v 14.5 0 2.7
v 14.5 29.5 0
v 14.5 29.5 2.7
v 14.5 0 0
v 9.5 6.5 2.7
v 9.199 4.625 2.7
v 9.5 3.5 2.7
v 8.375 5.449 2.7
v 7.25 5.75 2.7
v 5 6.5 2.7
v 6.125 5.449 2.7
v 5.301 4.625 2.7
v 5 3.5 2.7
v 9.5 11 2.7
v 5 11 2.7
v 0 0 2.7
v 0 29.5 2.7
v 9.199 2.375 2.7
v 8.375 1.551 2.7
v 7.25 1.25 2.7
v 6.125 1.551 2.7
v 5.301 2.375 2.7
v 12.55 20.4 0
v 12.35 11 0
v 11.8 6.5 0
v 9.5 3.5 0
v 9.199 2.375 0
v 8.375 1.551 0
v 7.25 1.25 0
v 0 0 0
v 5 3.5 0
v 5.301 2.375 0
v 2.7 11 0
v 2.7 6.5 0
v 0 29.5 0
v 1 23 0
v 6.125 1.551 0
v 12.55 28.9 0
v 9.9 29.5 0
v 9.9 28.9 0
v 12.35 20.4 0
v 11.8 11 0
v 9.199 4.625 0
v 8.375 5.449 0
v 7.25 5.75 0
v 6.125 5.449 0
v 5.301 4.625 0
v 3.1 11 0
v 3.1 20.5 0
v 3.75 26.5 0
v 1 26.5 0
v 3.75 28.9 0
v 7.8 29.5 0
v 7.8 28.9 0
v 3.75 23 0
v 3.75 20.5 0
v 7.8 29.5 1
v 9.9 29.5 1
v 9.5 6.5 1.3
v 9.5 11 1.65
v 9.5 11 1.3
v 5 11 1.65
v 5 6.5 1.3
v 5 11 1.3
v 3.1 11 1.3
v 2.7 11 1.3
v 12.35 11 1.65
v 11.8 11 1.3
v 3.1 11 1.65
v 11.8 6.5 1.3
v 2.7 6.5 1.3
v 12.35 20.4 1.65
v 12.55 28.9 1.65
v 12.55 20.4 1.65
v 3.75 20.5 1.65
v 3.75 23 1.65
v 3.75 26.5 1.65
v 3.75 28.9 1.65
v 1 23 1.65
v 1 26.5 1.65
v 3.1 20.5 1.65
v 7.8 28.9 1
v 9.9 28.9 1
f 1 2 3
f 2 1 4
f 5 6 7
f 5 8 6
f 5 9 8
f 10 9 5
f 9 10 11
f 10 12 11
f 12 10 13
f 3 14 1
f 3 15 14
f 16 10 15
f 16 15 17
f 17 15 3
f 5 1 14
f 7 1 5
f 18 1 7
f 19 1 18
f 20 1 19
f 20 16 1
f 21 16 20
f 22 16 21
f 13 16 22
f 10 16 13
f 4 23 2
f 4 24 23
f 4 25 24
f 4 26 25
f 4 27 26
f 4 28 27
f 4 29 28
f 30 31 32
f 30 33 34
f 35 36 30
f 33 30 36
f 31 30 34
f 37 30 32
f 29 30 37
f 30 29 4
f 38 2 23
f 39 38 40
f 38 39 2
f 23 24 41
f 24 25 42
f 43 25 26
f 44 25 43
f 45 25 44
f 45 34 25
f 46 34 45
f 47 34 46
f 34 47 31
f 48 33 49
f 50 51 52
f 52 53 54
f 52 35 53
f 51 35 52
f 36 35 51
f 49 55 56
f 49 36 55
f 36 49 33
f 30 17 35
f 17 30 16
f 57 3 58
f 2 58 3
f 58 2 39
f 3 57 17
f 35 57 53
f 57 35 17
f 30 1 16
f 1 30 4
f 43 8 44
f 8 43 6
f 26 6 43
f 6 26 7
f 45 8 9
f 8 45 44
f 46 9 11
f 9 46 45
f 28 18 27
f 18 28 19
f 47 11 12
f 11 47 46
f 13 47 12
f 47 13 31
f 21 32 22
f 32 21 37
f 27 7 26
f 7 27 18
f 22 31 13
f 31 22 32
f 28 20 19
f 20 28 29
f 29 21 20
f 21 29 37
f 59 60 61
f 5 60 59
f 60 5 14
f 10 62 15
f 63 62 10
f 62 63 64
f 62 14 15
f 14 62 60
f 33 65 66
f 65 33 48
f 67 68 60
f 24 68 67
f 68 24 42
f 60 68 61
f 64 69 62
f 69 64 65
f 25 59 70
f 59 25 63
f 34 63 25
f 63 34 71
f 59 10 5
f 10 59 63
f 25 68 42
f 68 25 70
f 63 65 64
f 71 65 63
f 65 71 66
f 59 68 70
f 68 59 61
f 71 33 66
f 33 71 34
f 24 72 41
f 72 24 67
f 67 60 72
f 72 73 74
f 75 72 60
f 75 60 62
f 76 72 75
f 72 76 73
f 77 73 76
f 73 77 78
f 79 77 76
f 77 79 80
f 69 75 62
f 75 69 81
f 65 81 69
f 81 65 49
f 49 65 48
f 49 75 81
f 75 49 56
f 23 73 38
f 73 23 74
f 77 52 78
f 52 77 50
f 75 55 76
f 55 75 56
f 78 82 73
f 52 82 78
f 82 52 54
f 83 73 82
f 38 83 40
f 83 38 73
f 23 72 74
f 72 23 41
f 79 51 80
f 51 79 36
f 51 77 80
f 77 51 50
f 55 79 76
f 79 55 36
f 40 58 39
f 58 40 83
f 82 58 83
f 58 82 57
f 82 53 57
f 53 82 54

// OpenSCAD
difference() {

   translate([0,0, 0.00001])
    cube([14.5, 29.5, 2.7]);
    
   translate([14.5 / 2, 1.25 + 2.25, 0])
        cylinder(3, 2.25, 2.25, $fn = 12);
    
   translate([14.5 / 2 - 2.25, 6.5, 0])
        cube([4.5, 4.5, 2.9]);
    
   translate([14.5 / 2 - 2.25 - 4.6 / 2, 6.5, 0])
        cube([4.5 + 4.6, 4.5, 1.3]);
    
   translate([3.1, 11, 0])
        cube([9.25, 9.5, 1.65]);
 
    translate([3.75, 20.4, 0])
        cube([8.8, 8.5, 1.65]);
    
    translate([1, 23, 0])
        cube([2.8, 3.5, 1.65]);
        
    translate([7.8, 24, 0])
        cube([2.1, 10, 1]);
}
